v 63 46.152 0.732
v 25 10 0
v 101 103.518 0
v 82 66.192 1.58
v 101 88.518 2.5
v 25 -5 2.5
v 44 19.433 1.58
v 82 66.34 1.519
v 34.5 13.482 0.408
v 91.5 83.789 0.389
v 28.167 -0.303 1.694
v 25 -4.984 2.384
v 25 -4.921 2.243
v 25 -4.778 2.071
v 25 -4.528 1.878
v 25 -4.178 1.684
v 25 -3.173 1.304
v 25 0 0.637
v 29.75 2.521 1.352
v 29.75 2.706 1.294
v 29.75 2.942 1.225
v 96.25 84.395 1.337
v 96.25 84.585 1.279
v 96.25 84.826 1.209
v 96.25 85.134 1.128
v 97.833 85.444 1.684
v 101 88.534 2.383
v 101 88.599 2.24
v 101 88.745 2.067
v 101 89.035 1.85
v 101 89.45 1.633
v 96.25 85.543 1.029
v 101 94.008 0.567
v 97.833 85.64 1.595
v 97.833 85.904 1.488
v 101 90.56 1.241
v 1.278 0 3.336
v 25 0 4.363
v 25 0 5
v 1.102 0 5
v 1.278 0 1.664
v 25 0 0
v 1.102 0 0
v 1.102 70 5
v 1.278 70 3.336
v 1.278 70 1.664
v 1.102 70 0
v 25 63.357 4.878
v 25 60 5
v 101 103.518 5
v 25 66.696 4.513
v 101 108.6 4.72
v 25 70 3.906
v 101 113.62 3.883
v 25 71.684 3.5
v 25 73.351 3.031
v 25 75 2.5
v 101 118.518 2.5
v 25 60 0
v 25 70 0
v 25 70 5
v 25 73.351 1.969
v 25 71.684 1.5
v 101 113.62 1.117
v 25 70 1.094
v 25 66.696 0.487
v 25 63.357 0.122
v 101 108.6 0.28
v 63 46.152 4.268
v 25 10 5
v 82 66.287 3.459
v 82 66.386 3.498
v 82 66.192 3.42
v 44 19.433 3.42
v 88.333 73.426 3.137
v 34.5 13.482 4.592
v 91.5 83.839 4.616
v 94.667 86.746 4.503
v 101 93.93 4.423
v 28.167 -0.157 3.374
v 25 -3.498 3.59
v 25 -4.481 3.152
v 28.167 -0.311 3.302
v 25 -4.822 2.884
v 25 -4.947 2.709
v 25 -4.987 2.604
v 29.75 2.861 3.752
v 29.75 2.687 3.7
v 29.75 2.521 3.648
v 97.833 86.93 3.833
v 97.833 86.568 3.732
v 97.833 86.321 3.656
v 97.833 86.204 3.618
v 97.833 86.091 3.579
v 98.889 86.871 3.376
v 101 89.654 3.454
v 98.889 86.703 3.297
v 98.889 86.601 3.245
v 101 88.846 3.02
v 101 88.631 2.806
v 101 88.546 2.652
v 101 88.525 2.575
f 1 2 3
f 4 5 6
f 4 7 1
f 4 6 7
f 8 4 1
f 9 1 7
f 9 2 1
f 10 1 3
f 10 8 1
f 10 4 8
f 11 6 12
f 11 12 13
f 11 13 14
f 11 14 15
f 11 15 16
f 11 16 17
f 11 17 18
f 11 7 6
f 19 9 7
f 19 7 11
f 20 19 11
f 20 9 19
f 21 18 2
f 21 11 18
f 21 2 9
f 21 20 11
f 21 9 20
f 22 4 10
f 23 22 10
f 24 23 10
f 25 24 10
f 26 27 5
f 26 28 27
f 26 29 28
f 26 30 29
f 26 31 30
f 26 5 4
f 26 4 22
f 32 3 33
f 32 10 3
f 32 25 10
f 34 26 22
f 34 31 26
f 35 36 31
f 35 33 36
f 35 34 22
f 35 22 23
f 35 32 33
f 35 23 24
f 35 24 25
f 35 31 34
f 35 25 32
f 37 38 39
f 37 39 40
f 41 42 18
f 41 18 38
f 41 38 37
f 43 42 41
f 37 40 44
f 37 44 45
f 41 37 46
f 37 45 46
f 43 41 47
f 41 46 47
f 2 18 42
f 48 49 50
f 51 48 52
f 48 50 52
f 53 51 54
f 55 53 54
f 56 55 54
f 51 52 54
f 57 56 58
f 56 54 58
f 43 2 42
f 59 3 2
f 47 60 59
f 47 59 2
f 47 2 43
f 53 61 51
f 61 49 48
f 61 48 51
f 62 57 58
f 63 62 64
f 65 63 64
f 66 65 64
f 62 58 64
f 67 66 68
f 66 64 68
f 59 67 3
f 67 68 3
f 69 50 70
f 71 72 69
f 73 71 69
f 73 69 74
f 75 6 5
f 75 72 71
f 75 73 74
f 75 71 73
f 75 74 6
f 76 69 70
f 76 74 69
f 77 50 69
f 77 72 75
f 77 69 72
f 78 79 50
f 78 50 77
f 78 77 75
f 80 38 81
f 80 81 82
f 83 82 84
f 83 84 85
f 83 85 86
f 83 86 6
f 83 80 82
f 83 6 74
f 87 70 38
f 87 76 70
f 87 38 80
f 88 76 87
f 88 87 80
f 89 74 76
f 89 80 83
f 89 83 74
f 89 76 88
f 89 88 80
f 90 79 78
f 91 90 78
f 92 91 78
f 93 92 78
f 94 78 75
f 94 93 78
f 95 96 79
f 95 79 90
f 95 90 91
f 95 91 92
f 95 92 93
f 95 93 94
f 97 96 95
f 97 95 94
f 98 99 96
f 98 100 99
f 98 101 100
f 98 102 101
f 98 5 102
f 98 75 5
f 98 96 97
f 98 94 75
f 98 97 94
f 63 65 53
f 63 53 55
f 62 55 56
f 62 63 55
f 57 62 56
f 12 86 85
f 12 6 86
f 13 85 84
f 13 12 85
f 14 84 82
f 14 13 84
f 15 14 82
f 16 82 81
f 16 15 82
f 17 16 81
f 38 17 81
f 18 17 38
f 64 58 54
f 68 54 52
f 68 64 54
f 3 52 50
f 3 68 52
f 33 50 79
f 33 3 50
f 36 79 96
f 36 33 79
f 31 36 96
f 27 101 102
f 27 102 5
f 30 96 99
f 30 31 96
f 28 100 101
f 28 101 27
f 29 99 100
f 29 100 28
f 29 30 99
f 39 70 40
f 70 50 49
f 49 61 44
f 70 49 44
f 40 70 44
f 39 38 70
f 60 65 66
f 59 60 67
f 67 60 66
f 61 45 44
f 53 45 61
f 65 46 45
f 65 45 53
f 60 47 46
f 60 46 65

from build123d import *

# Parameters (mm, degrees)
BOSS_EXTRUDE1_DEPTH = 5
CUT_EXTRUDE2_DEPTH  = 120.505652991
CUT_EXTRUDE3_DEPTH  = 87.577477123
SKETCH6_R           = 15.9
CUT_EXTRUDE7_DEPTH  = 126.900754709


with BuildPart() as part:
    # Sketch1 → Boss-Extrude1 (new body)
    with BuildSketch(Plane.XY):
        Polygon((0, 0), (0, 70), (25, 70), (25, 75), (101, 118.517979035), (101, 88.517979035), (25, -5), (25, 0), align=None)
    extrude(amount=BOSS_EXTRUDE1_DEPTH)

    # Sketch4 → Cut-Extrude2 (cut, along a direction that is not the sketch's normal)
    with BuildSketch(Plane(origin=(101, 0, 0), x_dir=(0, 0, -1), z_dir=(1, 0, 0))):
        with BuildLine():
            Line((0, 88.517979035), (0, 103.517979035))
            add(Edge.make_bspline(
                [(-2.5, 88.517979035), (0, 88.517979035), (0, 103.517979035)],
                knots=[6.283185307, 6.283185307, 6.283185307, 7.853981634, 7.853981634, 7.853981634], degree=2, weights=[1, 0.707106781, 1]))
            Line((-2.5, 88.517979035), (0, 88.517979035))
        make_face()
        with BuildLine():
            add(Edge.make_bspline(
                [(-5, 103.517979035), (-5, 88.517979035), (-2.5, 88.517979035)],
                knots=[4.71238898, 4.71238898, 4.71238898, 6.283185307, 6.283185307, 6.283185307], degree=2, weights=[1, 0.707106781, 1]))
            Line((-5, 103.517979035), (-5, 88.517979035))
            Line((-5, 88.517979035), (-2.5, 88.517979035))
        make_face()
    extrude(amount=-CUT_EXTRUDE2_DEPTH, dir=(0.6306758074312901, 0.7760464070665428, 0), mode=Mode.SUBTRACT)

    # Sketch5 → Cut-Extrude3 (cut, along a direction that is not the sketch's normal)
    with BuildSketch(Plane(origin=(101, 0, 0), x_dir=(0, 0, -1), z_dir=(1, 0, 0))):
        with BuildLine():
            ThreePointArc((-2.5, 118.517979035), (-0.629281023, 111.121432198), (0, 103.517979035))
            Line((0, 103.517979035), (0, 118.517979035))
            Line((0, 118.517979035), (-2.5, 118.517979035))
        make_face()
        with BuildLine():
            Line((-5, 118.517979035), (-5, 103.517979035))
            ThreePointArc((-5, 103.517979035), (-4.370718977, 111.121432198), (-2.5, 118.517979035))
            Line((-2.5, 118.517979035), (-5, 118.517979035))
        make_face()
    extrude(amount=-CUT_EXTRUDE3_DEPTH, dir=(0.8678030299169633, 0.4969083429234592, 0), mode=Mode.SUBTRACT)

    # Sketch6 → Cut-Extrude7 (cut, through all)
    with BuildSketch(Plane(origin=(0, 70, 0), x_dir=(1, 0, 0), z_dir=(0, 1, 0))):
        with Locations((-14.6, -2.5)):
            Circle(SKETCH6_R)
    extrude(amount=-CUT_EXTRUDE7_DEPTH, mode=Mode.SUBTRACT)


solid = part.part
